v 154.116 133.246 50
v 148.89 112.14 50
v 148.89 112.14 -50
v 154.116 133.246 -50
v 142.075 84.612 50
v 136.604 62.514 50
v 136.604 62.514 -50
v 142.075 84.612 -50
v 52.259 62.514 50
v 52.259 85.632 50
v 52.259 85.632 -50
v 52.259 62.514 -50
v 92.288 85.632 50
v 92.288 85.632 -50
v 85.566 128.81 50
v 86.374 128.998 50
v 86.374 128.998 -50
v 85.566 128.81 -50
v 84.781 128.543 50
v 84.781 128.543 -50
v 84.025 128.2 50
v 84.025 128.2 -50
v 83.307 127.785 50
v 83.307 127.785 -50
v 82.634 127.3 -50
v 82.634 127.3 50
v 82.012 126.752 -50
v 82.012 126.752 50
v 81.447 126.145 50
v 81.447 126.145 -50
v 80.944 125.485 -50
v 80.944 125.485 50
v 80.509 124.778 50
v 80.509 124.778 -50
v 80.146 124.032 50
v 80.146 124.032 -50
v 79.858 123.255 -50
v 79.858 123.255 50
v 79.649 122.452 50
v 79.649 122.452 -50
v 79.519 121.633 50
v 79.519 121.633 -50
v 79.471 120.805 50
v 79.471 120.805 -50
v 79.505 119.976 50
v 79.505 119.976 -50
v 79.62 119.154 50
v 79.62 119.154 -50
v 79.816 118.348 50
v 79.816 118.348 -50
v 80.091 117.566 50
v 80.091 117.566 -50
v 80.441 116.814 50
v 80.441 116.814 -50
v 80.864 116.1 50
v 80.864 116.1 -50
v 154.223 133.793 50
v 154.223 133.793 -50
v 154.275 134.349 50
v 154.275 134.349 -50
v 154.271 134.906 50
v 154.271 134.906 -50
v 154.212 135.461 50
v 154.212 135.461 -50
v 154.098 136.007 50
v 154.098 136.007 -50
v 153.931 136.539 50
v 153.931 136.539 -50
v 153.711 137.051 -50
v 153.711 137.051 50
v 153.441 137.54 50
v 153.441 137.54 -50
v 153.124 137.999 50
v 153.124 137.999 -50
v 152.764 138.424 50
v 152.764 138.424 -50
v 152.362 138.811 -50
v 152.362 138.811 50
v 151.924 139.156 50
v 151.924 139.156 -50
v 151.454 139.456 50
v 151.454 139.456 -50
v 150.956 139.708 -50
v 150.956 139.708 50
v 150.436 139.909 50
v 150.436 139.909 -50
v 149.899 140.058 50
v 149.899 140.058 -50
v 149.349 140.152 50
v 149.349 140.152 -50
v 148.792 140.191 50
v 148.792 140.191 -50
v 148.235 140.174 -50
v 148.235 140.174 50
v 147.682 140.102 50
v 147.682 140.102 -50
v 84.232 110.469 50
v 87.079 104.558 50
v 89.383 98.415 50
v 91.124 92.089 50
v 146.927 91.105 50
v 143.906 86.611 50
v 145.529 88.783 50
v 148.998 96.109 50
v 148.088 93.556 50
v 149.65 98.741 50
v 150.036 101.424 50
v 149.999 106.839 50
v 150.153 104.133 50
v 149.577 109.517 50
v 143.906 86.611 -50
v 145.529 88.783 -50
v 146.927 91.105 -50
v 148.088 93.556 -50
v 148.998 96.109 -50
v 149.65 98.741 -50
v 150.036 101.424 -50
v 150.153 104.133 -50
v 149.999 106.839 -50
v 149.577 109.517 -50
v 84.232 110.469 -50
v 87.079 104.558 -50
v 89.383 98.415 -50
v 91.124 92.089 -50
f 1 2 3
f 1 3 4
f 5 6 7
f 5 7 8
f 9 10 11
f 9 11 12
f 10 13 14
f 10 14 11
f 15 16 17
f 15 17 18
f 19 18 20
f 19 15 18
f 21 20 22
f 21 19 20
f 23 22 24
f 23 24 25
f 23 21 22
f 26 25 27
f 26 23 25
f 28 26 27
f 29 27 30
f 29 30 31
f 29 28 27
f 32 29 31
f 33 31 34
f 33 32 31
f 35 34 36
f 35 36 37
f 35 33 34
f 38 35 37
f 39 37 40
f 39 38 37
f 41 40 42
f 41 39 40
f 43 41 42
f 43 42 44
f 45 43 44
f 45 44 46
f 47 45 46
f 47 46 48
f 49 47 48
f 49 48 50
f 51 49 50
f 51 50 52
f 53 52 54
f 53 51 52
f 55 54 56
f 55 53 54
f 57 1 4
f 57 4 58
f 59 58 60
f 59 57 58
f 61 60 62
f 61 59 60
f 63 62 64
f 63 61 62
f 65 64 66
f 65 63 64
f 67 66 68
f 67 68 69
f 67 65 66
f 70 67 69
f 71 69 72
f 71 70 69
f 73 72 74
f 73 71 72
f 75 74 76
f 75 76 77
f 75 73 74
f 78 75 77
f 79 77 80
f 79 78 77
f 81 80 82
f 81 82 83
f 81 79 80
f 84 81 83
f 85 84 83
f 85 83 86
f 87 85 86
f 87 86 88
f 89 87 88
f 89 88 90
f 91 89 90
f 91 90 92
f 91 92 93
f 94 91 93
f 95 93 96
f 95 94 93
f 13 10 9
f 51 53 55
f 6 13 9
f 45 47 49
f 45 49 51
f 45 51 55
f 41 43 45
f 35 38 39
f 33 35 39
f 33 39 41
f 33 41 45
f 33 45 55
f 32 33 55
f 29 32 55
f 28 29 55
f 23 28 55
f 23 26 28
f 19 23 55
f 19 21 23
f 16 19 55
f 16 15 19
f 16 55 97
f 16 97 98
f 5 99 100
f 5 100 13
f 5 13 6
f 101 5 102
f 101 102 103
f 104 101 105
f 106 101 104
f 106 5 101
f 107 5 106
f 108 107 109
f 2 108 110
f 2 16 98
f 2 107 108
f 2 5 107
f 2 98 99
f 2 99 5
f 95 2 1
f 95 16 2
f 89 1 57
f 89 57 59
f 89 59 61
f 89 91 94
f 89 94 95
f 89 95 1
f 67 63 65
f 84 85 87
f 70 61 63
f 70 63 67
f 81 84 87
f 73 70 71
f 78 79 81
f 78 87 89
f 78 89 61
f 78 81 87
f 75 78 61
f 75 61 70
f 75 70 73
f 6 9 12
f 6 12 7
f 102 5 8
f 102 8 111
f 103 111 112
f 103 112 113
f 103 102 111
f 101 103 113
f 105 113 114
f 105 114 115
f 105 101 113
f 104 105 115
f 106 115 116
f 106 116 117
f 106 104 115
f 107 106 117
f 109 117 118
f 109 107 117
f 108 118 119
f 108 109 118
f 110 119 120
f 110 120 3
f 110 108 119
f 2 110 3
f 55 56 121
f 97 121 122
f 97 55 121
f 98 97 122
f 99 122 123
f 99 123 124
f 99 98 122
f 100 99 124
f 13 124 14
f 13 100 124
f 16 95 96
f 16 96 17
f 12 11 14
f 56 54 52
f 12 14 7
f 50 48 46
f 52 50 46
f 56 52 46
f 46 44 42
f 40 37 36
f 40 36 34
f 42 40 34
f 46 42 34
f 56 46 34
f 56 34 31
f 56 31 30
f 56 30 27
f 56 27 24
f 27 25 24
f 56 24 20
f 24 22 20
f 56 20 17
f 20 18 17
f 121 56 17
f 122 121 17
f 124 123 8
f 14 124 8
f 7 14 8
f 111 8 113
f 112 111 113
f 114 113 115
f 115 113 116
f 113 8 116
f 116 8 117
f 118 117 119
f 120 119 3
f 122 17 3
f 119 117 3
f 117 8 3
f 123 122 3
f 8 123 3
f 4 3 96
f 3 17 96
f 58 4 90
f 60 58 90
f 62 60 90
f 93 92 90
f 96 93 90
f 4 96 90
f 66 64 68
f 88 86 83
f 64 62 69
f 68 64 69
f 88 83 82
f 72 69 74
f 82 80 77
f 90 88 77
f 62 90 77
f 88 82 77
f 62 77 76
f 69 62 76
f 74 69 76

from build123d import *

# Parameters (mm, degrees)
EXTRUDE_1_DEPTH                = 50
SPLIT_BODIES_1_SURFACE_1_BACK  = 232.206
SPLIT_BODIES_1_SURFACE_1_DEPTH = 464.412
SPLIT_BODIES_1_SURFACE_2_BACK  = 232.206
SPLIT_BODIES_1_SURFACE_2_DEPTH = 464.412


with BuildPart() as part:
    # 草图2 → 凸台-拉伸1 (new, symmetric)
    with BuildSketch(Plane.XY):
        with BuildLine():
            Line((120.381757685, 62.513778912), (136.603924057, 62.513778912))
            Line((136.603924057, 62.513778912), (142.075022588, 84.611982407))
            ThreePointArc((142.075022588, 84.611982407), (149.356663913, 97.416787069), (148.890397999, 112.139827479))
            Line((148.890397999, 112.139827479), (154.115877694, 133.245956899))
            ThreePointArc((154.115877694, 133.245956899), (152.763547037, 138.423832473), (147.681959543, 140.102123925))
            Line((147.681959543, 140.102123925), (86.373837206, 128.997923897))
            ThreePointArc((86.373837206, 128.997923897), (80.146286191, 124.032461274), (80.863683371, 116.100024575))
            ThreePointArc((80.863683371, 116.100024575), (88.300101913, 101.512259026), (92.288223879, 85.631512581))
            Line((92.288223879, 85.631512581), (52.259104564, 85.631512581))
            Line((52.259104564, 85.631512581), (52.259104564, 37.347972633))
            Line((52.259104564, 37.347972633), (26.12059868, 28.530814049))
            Line((26.12059868, 28.530814049), (0, 28.530814049))
            Line((0, 28.530814049), (0, 0))
            Line((0, 0), (140.98, 0))
            Line((140.98, 0), (131.928221984, 26.834036233))
            Line((131.928221984, 26.834036233), (115.249995775, 26.834036233))
            Line((115.249995775, 26.834036233), (120.381757685, 62.513778912))
        make_face()
    extrude(amount=EXTRUDE_1_DEPTH, both=True)


with BuildPart() as body_2:
    # Split Bodies 1: the piece behind the surface
    add(part.part)
    # Split Bodies 1 surface: a surface, the sketch's curves swept straight by 464.412 mm
    with BuildLine(Plane.XY.offset(50).offset(-SPLIT_BODIES_1_SURFACE_1_BACK), mode=Mode.PRIVATE) as split_bodies_1_surface_1_path:
        Line((120.381757685, 62.513778912), (52.259104564, 62.513778912))
    split_bodies_1_surface_1 = Shell.extrude(split_bodies_1_surface_1_path.wire(), (0 * SPLIT_BODIES_1_SURFACE_1_DEPTH, 0 * SPLIT_BODIES_1_SURFACE_1_DEPTH, 1 * SPLIT_BODIES_1_SURFACE_1_DEPTH))
    split(bisect_by=split_bodies_1_surface_1, keep=Keep.BOTTOM)


with BuildPart() as part_1:
    add(part.part)

    # Split Bodies 1: split by a surface, the side it looks to stays
    # Split Bodies 1 surface: a surface, the sketch's curves swept straight by 464.412 mm
    with BuildLine(Plane.XY.offset(50).offset(-SPLIT_BODIES_1_SURFACE_2_BACK), mode=Mode.PRIVATE) as split_bodies_1_surface_2_path:
        Line((120.381757685, 62.513778912), (52.259104564, 62.513778912))
    split_bodies_1_surface_2 = Shell.extrude(split_bodies_1_surface_2_path.wire(), (0 * SPLIT_BODIES_1_SURFACE_2_DEPTH, 0 * SPLIT_BODIES_1_SURFACE_2_DEPTH, 1 * SPLIT_BODIES_1_SURFACE_2_DEPTH))
    split(bisect_by=split_bodies_1_surface_2, keep=Keep.TOP)


solid = body_2.part
